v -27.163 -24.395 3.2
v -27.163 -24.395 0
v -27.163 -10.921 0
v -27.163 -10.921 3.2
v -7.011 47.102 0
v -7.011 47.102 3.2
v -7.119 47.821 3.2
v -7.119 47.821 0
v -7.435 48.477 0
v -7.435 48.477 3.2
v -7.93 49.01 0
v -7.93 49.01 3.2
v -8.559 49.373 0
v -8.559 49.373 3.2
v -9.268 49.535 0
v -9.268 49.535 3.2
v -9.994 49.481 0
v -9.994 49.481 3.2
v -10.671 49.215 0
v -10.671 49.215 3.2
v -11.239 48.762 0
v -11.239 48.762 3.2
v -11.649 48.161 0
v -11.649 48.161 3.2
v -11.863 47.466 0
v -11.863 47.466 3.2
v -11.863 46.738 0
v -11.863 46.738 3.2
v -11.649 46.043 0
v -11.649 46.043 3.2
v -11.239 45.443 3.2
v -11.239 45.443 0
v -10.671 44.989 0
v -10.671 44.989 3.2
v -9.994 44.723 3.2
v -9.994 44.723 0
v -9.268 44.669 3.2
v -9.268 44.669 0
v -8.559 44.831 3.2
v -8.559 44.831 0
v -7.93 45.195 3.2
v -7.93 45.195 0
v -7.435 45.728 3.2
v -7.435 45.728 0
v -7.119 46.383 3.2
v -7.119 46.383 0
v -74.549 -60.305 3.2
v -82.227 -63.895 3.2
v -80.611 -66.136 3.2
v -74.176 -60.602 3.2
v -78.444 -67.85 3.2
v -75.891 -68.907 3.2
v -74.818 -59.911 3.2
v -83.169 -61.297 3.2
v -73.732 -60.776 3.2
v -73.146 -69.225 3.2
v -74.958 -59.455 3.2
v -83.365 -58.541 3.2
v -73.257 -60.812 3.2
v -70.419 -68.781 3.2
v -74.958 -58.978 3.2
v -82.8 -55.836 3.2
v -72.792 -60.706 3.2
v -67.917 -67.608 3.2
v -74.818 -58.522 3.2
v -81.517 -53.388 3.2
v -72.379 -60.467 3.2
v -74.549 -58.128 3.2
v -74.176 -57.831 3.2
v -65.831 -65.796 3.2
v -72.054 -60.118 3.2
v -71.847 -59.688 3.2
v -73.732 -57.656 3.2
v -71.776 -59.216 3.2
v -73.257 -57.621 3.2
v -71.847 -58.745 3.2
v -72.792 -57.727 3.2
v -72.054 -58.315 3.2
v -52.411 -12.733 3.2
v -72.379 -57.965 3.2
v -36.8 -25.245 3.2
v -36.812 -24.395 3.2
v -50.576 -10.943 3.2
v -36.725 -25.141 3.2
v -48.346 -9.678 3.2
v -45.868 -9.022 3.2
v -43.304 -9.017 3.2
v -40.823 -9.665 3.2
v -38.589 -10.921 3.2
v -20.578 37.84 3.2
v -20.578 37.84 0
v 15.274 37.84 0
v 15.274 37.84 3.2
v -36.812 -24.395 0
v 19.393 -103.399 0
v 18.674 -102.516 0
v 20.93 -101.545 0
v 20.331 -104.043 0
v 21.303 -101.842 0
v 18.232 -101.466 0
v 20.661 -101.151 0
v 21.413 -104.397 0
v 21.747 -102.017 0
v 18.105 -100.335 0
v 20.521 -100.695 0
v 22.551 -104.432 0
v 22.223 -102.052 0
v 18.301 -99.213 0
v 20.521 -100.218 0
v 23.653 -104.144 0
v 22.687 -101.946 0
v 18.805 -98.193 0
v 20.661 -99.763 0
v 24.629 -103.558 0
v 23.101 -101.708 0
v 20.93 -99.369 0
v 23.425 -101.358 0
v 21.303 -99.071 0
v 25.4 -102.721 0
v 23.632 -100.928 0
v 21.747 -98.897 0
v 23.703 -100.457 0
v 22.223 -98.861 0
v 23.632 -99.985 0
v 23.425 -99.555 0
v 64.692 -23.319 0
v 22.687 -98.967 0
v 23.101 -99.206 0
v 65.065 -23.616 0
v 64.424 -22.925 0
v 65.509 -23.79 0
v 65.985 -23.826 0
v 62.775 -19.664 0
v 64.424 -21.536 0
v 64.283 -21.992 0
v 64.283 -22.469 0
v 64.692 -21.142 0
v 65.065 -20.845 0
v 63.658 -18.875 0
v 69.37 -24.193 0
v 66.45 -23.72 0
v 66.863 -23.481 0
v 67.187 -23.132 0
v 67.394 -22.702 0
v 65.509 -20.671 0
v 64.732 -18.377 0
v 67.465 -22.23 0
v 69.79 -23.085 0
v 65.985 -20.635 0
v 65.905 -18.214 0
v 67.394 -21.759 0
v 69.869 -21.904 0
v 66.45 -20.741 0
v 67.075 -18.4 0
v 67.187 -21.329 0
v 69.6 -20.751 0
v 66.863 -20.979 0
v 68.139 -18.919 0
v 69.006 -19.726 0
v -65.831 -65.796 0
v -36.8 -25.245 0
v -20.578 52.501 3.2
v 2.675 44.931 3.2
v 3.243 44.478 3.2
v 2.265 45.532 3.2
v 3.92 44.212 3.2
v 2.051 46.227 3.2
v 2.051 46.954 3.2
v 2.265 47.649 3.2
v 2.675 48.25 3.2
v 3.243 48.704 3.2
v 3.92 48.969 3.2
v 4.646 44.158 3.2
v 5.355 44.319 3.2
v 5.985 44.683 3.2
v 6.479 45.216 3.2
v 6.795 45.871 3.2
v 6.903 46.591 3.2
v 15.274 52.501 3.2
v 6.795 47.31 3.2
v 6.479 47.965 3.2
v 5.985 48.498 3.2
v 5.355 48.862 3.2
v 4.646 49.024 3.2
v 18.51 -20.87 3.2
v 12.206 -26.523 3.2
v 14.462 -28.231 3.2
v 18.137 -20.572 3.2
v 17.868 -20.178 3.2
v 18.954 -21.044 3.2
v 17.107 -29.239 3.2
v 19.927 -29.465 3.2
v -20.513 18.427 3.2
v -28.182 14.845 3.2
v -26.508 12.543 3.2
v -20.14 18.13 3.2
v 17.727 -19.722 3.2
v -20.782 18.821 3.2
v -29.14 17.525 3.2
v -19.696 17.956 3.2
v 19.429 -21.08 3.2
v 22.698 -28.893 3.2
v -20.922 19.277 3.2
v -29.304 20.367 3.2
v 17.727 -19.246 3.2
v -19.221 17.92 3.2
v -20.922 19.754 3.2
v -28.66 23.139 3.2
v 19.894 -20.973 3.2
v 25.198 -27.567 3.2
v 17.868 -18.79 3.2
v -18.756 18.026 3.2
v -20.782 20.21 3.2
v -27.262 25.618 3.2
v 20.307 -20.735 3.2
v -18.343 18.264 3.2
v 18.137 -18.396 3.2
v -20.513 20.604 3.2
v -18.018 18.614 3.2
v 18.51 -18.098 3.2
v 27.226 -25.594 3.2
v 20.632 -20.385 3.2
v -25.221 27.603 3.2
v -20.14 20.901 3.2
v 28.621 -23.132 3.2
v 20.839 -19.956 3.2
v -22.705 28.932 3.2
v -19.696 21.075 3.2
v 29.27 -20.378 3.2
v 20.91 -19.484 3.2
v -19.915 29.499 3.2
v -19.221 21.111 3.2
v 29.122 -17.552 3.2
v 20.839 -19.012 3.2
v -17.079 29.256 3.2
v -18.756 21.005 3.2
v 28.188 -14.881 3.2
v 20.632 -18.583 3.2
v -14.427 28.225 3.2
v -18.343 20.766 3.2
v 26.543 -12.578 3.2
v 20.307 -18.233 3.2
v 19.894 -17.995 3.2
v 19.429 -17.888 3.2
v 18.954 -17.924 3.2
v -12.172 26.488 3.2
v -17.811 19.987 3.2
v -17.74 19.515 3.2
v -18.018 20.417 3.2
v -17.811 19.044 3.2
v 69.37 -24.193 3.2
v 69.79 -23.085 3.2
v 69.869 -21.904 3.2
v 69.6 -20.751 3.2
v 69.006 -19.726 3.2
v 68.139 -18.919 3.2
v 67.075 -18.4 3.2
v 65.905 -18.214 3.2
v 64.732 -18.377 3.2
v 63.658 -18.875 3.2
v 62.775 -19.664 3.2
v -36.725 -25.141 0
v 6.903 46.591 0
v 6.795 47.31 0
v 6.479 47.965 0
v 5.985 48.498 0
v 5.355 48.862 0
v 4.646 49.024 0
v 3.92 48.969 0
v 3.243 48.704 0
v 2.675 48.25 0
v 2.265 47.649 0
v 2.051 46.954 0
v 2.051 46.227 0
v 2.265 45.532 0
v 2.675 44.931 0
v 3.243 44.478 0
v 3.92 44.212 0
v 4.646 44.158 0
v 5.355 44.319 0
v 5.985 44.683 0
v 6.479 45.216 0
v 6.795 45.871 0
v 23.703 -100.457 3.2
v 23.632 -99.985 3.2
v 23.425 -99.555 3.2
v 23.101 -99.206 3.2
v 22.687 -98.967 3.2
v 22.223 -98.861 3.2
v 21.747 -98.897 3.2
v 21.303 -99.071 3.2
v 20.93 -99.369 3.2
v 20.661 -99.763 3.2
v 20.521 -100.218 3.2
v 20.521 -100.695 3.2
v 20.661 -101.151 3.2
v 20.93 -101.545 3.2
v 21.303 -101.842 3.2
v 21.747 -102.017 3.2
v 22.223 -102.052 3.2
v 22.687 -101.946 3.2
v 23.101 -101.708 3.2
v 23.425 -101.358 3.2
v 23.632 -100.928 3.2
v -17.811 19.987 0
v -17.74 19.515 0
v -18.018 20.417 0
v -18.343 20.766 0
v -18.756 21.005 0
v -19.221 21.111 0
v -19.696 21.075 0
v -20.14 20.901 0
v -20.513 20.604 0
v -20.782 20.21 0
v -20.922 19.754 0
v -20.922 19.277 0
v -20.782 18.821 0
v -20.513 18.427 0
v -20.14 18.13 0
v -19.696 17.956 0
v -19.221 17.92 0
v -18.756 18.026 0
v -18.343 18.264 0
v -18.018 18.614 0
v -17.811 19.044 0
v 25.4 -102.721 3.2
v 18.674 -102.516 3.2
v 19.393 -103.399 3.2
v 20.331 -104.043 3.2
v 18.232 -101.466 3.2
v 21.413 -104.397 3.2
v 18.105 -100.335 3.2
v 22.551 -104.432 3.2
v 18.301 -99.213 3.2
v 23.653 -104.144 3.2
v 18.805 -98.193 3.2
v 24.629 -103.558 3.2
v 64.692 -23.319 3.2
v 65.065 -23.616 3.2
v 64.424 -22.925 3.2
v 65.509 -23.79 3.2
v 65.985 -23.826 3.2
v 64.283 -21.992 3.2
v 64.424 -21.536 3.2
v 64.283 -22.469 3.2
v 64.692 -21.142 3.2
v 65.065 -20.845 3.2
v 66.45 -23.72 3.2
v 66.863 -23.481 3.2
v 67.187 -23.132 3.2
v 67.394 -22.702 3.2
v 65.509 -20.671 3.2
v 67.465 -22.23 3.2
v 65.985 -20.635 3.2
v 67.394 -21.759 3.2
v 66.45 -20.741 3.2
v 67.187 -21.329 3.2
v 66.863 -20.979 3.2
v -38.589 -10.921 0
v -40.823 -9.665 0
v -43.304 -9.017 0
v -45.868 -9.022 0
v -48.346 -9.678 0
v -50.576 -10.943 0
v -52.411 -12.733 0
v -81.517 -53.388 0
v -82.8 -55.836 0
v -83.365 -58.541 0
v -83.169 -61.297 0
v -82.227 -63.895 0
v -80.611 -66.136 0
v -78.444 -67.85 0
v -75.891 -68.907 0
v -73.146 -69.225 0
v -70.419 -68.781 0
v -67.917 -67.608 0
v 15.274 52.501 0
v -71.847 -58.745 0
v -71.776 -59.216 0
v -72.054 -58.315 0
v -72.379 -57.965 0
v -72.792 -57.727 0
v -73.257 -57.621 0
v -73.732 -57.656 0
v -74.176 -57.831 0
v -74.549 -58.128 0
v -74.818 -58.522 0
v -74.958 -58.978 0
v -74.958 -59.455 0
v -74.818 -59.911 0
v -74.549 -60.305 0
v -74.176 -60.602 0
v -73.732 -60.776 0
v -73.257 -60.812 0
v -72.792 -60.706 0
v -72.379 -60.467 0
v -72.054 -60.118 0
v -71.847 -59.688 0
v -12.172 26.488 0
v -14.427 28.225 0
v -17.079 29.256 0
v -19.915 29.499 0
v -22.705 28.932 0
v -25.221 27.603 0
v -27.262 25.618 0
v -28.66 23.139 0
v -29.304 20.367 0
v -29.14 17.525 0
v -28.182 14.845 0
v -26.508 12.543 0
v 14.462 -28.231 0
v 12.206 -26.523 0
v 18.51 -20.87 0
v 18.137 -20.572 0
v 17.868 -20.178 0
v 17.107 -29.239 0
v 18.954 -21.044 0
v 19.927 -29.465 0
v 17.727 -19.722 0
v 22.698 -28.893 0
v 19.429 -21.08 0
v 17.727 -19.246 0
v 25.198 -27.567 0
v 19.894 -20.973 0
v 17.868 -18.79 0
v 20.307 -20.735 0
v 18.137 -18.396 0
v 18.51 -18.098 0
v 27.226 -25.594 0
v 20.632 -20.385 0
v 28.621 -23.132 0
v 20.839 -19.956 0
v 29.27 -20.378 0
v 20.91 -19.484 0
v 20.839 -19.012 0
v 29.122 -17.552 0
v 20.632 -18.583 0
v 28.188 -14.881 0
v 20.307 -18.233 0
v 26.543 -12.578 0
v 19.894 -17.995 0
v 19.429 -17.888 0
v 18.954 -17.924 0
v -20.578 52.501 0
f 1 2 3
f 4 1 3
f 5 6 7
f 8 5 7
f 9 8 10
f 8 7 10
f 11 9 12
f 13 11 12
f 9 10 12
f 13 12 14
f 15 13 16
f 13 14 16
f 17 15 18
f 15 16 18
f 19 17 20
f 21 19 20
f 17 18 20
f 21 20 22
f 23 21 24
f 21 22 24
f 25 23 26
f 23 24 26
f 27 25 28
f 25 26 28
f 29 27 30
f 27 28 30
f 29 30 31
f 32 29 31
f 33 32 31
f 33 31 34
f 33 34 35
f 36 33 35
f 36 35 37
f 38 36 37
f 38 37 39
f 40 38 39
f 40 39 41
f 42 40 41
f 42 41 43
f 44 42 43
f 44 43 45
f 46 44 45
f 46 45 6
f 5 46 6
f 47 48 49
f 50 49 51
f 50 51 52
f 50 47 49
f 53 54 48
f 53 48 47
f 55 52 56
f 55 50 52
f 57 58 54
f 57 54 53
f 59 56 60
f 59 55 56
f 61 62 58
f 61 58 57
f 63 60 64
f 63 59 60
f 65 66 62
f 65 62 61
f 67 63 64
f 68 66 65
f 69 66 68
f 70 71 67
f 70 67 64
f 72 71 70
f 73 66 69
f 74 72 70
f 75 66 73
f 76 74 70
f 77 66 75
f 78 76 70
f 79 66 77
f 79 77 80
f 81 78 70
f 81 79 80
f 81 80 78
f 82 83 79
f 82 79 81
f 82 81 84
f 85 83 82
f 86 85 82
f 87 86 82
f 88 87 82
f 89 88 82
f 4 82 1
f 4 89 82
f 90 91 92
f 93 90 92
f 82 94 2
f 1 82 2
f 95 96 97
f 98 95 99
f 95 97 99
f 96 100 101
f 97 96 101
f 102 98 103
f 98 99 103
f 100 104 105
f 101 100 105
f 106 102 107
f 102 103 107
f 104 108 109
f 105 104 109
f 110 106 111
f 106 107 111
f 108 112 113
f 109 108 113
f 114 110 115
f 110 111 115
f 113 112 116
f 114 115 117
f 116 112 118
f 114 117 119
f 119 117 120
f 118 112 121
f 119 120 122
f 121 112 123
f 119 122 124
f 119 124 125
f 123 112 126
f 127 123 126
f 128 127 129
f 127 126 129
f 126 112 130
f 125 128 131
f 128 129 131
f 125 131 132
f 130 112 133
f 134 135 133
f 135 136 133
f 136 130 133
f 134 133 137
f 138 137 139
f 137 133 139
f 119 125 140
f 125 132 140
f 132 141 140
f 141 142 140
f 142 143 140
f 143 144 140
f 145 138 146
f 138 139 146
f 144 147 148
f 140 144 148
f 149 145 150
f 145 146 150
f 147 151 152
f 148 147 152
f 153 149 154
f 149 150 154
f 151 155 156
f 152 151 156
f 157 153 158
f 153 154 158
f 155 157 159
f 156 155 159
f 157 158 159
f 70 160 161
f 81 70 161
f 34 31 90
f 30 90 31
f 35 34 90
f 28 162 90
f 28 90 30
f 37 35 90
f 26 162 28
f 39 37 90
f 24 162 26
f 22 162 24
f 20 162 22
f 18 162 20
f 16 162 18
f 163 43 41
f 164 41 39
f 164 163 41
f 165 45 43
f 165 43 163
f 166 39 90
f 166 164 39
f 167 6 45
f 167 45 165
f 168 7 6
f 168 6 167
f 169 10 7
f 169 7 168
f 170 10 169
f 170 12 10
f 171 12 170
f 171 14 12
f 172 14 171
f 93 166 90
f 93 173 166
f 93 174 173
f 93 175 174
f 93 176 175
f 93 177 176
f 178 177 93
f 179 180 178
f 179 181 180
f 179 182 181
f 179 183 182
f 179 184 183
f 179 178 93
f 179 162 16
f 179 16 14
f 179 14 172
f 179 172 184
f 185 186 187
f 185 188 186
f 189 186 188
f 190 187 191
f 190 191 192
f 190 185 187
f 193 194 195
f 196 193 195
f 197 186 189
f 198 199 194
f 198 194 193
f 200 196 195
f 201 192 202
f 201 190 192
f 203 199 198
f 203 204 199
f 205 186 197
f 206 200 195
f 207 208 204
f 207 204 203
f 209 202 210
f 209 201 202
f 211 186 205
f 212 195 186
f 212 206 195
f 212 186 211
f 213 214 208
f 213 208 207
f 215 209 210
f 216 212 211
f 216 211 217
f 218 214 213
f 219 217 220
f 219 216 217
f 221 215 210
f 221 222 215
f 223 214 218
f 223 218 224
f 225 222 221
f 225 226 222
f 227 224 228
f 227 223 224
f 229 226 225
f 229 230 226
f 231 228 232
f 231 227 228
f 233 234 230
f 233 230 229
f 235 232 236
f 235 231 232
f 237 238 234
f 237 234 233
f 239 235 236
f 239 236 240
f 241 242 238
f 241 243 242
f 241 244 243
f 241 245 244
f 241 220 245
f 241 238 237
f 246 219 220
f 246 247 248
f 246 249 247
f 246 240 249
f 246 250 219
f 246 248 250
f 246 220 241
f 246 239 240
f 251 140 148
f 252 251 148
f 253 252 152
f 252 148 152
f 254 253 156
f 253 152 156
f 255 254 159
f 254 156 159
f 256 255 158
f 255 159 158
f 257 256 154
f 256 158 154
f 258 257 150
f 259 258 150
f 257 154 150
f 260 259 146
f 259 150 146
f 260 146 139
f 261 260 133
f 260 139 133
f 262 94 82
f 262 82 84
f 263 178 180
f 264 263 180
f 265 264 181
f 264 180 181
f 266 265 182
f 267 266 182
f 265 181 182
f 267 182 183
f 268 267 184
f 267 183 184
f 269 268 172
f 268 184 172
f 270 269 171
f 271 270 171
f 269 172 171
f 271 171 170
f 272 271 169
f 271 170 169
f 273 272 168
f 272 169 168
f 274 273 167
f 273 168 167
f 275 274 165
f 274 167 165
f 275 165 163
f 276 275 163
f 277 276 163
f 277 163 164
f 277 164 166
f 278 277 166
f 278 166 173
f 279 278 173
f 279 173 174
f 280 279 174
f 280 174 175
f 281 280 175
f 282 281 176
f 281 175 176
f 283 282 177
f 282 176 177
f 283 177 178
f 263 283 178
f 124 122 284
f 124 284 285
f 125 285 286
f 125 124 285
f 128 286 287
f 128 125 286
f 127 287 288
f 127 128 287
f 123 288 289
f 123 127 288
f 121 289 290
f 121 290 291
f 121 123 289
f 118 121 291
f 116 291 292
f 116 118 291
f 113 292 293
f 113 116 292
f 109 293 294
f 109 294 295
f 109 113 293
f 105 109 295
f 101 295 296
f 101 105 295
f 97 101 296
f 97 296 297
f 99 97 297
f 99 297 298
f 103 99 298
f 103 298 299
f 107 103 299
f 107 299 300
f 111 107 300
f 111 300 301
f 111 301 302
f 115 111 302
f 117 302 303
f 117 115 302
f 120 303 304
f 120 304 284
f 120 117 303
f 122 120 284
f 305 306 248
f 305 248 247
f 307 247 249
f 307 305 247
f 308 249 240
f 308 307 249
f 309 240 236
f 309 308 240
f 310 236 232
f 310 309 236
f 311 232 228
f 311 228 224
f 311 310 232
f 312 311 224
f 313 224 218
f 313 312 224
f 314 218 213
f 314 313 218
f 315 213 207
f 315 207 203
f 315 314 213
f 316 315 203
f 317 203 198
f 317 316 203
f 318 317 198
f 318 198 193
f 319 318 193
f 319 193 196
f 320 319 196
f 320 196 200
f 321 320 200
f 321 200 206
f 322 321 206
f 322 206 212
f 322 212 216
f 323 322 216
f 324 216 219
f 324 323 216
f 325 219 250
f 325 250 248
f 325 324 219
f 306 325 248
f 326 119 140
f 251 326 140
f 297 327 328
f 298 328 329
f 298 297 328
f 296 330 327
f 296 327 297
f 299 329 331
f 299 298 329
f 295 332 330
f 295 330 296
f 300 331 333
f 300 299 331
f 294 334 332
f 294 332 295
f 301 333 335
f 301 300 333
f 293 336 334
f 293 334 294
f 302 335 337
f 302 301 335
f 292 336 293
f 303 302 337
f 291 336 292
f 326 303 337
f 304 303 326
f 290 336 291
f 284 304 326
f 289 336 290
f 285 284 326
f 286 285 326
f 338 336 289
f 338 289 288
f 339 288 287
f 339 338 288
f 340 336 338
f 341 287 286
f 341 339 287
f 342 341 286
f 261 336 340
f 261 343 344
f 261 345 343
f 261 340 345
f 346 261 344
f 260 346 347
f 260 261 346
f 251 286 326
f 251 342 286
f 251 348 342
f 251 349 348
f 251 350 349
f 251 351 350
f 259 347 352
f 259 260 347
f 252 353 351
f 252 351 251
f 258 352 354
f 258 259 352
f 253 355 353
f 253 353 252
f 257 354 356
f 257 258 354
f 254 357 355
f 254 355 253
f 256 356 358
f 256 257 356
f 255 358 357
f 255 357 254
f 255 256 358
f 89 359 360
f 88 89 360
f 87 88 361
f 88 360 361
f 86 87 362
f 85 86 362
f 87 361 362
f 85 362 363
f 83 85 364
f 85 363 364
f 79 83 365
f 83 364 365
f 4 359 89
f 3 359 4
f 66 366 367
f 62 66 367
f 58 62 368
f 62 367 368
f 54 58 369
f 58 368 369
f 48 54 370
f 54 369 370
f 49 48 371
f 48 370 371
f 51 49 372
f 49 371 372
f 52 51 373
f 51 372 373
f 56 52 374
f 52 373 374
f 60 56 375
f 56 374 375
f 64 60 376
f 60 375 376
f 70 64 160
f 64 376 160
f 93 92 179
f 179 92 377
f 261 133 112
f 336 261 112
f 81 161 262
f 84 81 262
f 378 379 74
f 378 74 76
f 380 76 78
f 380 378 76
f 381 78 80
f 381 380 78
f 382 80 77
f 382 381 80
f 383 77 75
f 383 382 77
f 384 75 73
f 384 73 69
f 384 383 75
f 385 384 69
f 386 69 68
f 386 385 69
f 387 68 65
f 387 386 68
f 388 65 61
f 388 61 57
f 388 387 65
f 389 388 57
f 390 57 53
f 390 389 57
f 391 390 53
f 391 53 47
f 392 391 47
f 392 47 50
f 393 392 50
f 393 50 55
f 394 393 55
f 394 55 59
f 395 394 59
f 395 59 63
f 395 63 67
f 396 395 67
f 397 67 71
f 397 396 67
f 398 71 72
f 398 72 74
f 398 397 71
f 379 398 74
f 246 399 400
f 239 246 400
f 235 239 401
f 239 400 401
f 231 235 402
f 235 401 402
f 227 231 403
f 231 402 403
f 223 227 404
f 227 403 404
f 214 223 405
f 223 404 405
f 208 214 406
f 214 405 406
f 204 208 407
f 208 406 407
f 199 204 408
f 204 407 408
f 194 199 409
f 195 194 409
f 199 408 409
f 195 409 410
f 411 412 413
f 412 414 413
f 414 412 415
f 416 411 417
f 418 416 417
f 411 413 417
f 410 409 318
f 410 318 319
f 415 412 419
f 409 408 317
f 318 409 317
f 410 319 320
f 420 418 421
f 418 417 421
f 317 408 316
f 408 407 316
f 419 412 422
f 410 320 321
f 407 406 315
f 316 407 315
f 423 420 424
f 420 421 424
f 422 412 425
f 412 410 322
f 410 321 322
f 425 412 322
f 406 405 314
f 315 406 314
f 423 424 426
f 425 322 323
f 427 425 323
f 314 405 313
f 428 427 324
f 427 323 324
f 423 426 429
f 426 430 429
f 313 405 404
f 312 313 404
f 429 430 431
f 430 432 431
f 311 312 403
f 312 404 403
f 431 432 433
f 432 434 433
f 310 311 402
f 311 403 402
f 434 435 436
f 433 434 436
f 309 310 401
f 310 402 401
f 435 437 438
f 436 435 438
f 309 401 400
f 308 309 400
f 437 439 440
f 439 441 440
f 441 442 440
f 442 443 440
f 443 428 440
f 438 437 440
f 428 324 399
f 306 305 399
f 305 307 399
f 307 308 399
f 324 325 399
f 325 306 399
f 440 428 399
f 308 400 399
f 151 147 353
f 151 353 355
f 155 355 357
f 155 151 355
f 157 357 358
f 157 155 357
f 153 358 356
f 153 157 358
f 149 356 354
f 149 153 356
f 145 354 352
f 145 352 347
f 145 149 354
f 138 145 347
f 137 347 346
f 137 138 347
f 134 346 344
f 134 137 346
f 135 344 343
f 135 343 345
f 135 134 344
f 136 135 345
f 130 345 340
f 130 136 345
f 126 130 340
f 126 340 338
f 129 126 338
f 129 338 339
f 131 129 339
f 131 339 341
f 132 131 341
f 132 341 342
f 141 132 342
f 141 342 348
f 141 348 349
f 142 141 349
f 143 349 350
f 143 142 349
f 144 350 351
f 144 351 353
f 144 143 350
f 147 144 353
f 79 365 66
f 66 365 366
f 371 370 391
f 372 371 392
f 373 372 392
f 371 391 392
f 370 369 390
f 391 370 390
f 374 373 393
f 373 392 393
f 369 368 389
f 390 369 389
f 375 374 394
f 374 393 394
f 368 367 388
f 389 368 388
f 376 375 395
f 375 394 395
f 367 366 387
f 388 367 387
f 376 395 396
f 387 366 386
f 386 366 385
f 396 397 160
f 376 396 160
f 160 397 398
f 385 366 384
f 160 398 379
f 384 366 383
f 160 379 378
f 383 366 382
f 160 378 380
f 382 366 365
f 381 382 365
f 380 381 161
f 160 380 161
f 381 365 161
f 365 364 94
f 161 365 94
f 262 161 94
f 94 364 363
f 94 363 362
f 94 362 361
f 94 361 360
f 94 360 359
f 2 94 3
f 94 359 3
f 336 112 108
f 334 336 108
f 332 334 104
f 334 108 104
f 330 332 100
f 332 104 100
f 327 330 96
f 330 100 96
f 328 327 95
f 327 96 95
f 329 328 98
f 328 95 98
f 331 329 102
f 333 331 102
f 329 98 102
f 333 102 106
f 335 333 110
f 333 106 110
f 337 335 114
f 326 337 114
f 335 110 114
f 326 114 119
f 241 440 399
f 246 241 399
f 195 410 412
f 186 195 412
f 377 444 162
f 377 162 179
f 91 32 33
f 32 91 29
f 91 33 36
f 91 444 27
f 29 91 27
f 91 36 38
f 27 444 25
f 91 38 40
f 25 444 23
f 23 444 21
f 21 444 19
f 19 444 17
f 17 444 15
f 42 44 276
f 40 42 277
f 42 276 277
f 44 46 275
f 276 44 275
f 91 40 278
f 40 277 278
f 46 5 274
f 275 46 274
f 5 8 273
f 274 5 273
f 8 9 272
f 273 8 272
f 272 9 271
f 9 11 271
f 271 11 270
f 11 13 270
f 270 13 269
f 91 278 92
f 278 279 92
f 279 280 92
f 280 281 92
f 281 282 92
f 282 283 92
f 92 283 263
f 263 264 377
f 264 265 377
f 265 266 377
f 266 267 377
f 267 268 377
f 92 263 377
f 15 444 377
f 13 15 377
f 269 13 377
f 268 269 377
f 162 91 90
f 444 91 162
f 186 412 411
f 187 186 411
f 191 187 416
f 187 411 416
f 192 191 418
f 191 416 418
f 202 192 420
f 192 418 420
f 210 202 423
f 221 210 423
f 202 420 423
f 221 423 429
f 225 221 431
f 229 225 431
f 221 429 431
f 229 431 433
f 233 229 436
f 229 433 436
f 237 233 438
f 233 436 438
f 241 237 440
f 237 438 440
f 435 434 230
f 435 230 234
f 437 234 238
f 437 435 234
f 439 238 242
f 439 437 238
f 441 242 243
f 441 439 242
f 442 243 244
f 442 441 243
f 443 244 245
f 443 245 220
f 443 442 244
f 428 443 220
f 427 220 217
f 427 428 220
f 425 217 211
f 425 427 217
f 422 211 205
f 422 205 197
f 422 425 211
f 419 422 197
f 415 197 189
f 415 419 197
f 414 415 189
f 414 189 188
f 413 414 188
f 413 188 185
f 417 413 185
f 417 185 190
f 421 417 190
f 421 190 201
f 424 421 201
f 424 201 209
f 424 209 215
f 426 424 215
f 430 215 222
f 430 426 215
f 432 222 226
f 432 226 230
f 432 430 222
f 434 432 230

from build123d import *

# Parameters (mm, degrees)
F1_R      = 1.6
F2_DEPTH  = 3.2
F4_DEPTH  = 25
F5_R      = 1.6
F6_DEPTH  = 3.2
F7_W      = 35.8522105962
F7_H      = 14.6616101265
F8_DEPTH  = 3.2
F9_R      = 2.4399255944
F10_DEPTH = 25
F0_R      = 1.6
F11_DEPTH = 3.2
F12_R     = 2.4399255944
F13_DEPTH = 3.2
F14_W     = 13.488072902
F14_H     = 13.4736970067
F15_DEPTH = 3.2


with BuildPart() as f2:
    # F1 (on Top) → F2 (new body)
    with BuildSketch(Plane.XY):
        with BuildLine():
            Line((-52.4111336428, -12.733045686), (-81.516712904, -53.3884912729))
            ThreePointArc((-81.516712904, -53.3884912729), (-79.5872905823, -67.0682565857), (-65.830813644, -65.7962535372))
            Line((-65.830813644, -65.7962535372), (-36.8001743822, -25.2454861304))
            Line((-36.8001743822, -25.2454861304), (-38.3891442742, -11.0743911007))
            ThreePointArc((-38.3891442742, -11.0743911007), (-45.7428894184, -9.0061631411), (-52.4111336428, -12.733045686))
        make_face()
        with Locations((-73.3762812727, -59.2162955103)):
            Circle(F1_R, mode=Mode.SUBTRACT)
        with BuildLine():
            ThreePointArc((-36.7252343828, -25.1408079503), (-34.6374203357, -17.7622214125), (-38.3891442742, -11.0743911007))
            Line((-38.3891442742, -11.0743911007), (-36.8001743822, -25.2454861304))
            Line((-36.8001743822, -25.2454861304), (-36.7252343828, -25.1408079503))
        make_face()
    extrude(amount=F2_DEPTH)

    # F3 (on face) → F4 (cut)
    with BuildSketch(Plane.XY.offset(3.2)):
        with BuildLine():
            add(Edge.make_bspline(
                [(-38.3643028806, -11.0939771882), (-36.5913216543, -11.8065384502), (-32.7913583718, -13.333743923), (-29.3885141198, -22.7559246447), (-34.3564646686, -24.3708127558), (-36.7252343828, -25.1408079503)],
                knots=[0, 0, 0, 0, 0.3139543375, 0.6728864002, 1, 1, 1, 1], degree=3))
            Line((-38.3643028806, -11.0939771882), (-36.7252343828, -25.1408079503))
        make_face()
    extrude(amount=-F4_DEPTH, mode=Mode.SUBTRACT)

    # F14 (on Top) → F15 (join)
    with BuildSketch(Plane.XY):
        with Locations((-33.9069012552, -17.6582150161)):
            Rectangle(F14_W, F14_H)
    extrude(amount=F15_DEPTH)


with BuildPart() as f6:
    # F5 (on Top) → F6 (new body)
    with BuildSketch(Plane.XY):
        with BuildLine():
            Line((25.4004618726, -102.7209598247), (69.3700621518, -24.1927849364))
            ThreePointArc((69.3700621518, -24.1927849364), (68.1389568472, -18.9191209459), (62.7750391721, -19.6644660543))
            Line((62.7750391721, -19.6644660543), (18.8054388929, -98.1926409426))
            ThreePointArc((18.8054388929, -98.1926409426), (19.8387909417, -103.7543118735), (25.4004618726, -102.7209598247))
        make_face()
        with Locations((22.1029503828, -100.4568003836)):
            Circle(F5_R, mode=Mode.SUBTRACT)
        with Locations((65.8653349998, -22.2304134413)):
            Circle(F5_R, mode=Mode.SUBTRACT)
    extrude(amount=F6_DEPTH)


with BuildPart() as f8:
    # F7 (on Top) → F8 (new body)
    with BuildSketch(Plane.XY):
        with Locations((-2.652307041, 45.170430094)):
            Rectangle(F7_W, F7_H)
    extrude(amount=F8_DEPTH)

    # F9 (on face) → F10 (cut)
    with BuildSketch(Plane.XY.offset(3.2)):
        with Locations((-9.4507699832, 47.1021160483)):
            Circle(F9_R)
    extrude(amount=-F10_DEPTH, mode=Mode.SUBTRACT)

    # F12 (on face) → F13 (cut)
    with BuildSketch(Plane.XY.offset(3.2)):
        with Locations((4.4632758945, 46.5906150639)):
            Circle(F12_R)
    extrude(amount=-F13_DEPTH, mode=Mode.SUBTRACT)


with BuildPart() as f11:
    # F0 (on Top) → F11 (new body)
    with BuildSketch(Plane.XY):
        with BuildLine():
            Line((-26.5083782919, 12.5428867212), (12.2063241712, -26.5233623078))
            ThreePointArc((12.2063241712, -26.5233623078), (26.2823887865, -26.652613175), (26.5428882901, -12.5783657404))
            Line((26.5428882901, -12.5783657404), (-12.171814173, 26.4878832886))
            ThreePointArc((-12.171814173, 26.4878832886), (-26.3125945162, 26.6836670643), (-26.5083782919, 12.5428867212))
        make_face()
        with Locations((19.3095873574, -19.484019458)):
            Circle(F0_R, mode=Mode.SUBTRACT)
        with Locations((-19.3400962325, 19.5153850049)):
            Circle(F0_R, mode=Mode.SUBTRACT)
    extrude(amount=F11_DEPTH)


solid = Compound([f2.part, f6.part, f8.part, f11.part])
